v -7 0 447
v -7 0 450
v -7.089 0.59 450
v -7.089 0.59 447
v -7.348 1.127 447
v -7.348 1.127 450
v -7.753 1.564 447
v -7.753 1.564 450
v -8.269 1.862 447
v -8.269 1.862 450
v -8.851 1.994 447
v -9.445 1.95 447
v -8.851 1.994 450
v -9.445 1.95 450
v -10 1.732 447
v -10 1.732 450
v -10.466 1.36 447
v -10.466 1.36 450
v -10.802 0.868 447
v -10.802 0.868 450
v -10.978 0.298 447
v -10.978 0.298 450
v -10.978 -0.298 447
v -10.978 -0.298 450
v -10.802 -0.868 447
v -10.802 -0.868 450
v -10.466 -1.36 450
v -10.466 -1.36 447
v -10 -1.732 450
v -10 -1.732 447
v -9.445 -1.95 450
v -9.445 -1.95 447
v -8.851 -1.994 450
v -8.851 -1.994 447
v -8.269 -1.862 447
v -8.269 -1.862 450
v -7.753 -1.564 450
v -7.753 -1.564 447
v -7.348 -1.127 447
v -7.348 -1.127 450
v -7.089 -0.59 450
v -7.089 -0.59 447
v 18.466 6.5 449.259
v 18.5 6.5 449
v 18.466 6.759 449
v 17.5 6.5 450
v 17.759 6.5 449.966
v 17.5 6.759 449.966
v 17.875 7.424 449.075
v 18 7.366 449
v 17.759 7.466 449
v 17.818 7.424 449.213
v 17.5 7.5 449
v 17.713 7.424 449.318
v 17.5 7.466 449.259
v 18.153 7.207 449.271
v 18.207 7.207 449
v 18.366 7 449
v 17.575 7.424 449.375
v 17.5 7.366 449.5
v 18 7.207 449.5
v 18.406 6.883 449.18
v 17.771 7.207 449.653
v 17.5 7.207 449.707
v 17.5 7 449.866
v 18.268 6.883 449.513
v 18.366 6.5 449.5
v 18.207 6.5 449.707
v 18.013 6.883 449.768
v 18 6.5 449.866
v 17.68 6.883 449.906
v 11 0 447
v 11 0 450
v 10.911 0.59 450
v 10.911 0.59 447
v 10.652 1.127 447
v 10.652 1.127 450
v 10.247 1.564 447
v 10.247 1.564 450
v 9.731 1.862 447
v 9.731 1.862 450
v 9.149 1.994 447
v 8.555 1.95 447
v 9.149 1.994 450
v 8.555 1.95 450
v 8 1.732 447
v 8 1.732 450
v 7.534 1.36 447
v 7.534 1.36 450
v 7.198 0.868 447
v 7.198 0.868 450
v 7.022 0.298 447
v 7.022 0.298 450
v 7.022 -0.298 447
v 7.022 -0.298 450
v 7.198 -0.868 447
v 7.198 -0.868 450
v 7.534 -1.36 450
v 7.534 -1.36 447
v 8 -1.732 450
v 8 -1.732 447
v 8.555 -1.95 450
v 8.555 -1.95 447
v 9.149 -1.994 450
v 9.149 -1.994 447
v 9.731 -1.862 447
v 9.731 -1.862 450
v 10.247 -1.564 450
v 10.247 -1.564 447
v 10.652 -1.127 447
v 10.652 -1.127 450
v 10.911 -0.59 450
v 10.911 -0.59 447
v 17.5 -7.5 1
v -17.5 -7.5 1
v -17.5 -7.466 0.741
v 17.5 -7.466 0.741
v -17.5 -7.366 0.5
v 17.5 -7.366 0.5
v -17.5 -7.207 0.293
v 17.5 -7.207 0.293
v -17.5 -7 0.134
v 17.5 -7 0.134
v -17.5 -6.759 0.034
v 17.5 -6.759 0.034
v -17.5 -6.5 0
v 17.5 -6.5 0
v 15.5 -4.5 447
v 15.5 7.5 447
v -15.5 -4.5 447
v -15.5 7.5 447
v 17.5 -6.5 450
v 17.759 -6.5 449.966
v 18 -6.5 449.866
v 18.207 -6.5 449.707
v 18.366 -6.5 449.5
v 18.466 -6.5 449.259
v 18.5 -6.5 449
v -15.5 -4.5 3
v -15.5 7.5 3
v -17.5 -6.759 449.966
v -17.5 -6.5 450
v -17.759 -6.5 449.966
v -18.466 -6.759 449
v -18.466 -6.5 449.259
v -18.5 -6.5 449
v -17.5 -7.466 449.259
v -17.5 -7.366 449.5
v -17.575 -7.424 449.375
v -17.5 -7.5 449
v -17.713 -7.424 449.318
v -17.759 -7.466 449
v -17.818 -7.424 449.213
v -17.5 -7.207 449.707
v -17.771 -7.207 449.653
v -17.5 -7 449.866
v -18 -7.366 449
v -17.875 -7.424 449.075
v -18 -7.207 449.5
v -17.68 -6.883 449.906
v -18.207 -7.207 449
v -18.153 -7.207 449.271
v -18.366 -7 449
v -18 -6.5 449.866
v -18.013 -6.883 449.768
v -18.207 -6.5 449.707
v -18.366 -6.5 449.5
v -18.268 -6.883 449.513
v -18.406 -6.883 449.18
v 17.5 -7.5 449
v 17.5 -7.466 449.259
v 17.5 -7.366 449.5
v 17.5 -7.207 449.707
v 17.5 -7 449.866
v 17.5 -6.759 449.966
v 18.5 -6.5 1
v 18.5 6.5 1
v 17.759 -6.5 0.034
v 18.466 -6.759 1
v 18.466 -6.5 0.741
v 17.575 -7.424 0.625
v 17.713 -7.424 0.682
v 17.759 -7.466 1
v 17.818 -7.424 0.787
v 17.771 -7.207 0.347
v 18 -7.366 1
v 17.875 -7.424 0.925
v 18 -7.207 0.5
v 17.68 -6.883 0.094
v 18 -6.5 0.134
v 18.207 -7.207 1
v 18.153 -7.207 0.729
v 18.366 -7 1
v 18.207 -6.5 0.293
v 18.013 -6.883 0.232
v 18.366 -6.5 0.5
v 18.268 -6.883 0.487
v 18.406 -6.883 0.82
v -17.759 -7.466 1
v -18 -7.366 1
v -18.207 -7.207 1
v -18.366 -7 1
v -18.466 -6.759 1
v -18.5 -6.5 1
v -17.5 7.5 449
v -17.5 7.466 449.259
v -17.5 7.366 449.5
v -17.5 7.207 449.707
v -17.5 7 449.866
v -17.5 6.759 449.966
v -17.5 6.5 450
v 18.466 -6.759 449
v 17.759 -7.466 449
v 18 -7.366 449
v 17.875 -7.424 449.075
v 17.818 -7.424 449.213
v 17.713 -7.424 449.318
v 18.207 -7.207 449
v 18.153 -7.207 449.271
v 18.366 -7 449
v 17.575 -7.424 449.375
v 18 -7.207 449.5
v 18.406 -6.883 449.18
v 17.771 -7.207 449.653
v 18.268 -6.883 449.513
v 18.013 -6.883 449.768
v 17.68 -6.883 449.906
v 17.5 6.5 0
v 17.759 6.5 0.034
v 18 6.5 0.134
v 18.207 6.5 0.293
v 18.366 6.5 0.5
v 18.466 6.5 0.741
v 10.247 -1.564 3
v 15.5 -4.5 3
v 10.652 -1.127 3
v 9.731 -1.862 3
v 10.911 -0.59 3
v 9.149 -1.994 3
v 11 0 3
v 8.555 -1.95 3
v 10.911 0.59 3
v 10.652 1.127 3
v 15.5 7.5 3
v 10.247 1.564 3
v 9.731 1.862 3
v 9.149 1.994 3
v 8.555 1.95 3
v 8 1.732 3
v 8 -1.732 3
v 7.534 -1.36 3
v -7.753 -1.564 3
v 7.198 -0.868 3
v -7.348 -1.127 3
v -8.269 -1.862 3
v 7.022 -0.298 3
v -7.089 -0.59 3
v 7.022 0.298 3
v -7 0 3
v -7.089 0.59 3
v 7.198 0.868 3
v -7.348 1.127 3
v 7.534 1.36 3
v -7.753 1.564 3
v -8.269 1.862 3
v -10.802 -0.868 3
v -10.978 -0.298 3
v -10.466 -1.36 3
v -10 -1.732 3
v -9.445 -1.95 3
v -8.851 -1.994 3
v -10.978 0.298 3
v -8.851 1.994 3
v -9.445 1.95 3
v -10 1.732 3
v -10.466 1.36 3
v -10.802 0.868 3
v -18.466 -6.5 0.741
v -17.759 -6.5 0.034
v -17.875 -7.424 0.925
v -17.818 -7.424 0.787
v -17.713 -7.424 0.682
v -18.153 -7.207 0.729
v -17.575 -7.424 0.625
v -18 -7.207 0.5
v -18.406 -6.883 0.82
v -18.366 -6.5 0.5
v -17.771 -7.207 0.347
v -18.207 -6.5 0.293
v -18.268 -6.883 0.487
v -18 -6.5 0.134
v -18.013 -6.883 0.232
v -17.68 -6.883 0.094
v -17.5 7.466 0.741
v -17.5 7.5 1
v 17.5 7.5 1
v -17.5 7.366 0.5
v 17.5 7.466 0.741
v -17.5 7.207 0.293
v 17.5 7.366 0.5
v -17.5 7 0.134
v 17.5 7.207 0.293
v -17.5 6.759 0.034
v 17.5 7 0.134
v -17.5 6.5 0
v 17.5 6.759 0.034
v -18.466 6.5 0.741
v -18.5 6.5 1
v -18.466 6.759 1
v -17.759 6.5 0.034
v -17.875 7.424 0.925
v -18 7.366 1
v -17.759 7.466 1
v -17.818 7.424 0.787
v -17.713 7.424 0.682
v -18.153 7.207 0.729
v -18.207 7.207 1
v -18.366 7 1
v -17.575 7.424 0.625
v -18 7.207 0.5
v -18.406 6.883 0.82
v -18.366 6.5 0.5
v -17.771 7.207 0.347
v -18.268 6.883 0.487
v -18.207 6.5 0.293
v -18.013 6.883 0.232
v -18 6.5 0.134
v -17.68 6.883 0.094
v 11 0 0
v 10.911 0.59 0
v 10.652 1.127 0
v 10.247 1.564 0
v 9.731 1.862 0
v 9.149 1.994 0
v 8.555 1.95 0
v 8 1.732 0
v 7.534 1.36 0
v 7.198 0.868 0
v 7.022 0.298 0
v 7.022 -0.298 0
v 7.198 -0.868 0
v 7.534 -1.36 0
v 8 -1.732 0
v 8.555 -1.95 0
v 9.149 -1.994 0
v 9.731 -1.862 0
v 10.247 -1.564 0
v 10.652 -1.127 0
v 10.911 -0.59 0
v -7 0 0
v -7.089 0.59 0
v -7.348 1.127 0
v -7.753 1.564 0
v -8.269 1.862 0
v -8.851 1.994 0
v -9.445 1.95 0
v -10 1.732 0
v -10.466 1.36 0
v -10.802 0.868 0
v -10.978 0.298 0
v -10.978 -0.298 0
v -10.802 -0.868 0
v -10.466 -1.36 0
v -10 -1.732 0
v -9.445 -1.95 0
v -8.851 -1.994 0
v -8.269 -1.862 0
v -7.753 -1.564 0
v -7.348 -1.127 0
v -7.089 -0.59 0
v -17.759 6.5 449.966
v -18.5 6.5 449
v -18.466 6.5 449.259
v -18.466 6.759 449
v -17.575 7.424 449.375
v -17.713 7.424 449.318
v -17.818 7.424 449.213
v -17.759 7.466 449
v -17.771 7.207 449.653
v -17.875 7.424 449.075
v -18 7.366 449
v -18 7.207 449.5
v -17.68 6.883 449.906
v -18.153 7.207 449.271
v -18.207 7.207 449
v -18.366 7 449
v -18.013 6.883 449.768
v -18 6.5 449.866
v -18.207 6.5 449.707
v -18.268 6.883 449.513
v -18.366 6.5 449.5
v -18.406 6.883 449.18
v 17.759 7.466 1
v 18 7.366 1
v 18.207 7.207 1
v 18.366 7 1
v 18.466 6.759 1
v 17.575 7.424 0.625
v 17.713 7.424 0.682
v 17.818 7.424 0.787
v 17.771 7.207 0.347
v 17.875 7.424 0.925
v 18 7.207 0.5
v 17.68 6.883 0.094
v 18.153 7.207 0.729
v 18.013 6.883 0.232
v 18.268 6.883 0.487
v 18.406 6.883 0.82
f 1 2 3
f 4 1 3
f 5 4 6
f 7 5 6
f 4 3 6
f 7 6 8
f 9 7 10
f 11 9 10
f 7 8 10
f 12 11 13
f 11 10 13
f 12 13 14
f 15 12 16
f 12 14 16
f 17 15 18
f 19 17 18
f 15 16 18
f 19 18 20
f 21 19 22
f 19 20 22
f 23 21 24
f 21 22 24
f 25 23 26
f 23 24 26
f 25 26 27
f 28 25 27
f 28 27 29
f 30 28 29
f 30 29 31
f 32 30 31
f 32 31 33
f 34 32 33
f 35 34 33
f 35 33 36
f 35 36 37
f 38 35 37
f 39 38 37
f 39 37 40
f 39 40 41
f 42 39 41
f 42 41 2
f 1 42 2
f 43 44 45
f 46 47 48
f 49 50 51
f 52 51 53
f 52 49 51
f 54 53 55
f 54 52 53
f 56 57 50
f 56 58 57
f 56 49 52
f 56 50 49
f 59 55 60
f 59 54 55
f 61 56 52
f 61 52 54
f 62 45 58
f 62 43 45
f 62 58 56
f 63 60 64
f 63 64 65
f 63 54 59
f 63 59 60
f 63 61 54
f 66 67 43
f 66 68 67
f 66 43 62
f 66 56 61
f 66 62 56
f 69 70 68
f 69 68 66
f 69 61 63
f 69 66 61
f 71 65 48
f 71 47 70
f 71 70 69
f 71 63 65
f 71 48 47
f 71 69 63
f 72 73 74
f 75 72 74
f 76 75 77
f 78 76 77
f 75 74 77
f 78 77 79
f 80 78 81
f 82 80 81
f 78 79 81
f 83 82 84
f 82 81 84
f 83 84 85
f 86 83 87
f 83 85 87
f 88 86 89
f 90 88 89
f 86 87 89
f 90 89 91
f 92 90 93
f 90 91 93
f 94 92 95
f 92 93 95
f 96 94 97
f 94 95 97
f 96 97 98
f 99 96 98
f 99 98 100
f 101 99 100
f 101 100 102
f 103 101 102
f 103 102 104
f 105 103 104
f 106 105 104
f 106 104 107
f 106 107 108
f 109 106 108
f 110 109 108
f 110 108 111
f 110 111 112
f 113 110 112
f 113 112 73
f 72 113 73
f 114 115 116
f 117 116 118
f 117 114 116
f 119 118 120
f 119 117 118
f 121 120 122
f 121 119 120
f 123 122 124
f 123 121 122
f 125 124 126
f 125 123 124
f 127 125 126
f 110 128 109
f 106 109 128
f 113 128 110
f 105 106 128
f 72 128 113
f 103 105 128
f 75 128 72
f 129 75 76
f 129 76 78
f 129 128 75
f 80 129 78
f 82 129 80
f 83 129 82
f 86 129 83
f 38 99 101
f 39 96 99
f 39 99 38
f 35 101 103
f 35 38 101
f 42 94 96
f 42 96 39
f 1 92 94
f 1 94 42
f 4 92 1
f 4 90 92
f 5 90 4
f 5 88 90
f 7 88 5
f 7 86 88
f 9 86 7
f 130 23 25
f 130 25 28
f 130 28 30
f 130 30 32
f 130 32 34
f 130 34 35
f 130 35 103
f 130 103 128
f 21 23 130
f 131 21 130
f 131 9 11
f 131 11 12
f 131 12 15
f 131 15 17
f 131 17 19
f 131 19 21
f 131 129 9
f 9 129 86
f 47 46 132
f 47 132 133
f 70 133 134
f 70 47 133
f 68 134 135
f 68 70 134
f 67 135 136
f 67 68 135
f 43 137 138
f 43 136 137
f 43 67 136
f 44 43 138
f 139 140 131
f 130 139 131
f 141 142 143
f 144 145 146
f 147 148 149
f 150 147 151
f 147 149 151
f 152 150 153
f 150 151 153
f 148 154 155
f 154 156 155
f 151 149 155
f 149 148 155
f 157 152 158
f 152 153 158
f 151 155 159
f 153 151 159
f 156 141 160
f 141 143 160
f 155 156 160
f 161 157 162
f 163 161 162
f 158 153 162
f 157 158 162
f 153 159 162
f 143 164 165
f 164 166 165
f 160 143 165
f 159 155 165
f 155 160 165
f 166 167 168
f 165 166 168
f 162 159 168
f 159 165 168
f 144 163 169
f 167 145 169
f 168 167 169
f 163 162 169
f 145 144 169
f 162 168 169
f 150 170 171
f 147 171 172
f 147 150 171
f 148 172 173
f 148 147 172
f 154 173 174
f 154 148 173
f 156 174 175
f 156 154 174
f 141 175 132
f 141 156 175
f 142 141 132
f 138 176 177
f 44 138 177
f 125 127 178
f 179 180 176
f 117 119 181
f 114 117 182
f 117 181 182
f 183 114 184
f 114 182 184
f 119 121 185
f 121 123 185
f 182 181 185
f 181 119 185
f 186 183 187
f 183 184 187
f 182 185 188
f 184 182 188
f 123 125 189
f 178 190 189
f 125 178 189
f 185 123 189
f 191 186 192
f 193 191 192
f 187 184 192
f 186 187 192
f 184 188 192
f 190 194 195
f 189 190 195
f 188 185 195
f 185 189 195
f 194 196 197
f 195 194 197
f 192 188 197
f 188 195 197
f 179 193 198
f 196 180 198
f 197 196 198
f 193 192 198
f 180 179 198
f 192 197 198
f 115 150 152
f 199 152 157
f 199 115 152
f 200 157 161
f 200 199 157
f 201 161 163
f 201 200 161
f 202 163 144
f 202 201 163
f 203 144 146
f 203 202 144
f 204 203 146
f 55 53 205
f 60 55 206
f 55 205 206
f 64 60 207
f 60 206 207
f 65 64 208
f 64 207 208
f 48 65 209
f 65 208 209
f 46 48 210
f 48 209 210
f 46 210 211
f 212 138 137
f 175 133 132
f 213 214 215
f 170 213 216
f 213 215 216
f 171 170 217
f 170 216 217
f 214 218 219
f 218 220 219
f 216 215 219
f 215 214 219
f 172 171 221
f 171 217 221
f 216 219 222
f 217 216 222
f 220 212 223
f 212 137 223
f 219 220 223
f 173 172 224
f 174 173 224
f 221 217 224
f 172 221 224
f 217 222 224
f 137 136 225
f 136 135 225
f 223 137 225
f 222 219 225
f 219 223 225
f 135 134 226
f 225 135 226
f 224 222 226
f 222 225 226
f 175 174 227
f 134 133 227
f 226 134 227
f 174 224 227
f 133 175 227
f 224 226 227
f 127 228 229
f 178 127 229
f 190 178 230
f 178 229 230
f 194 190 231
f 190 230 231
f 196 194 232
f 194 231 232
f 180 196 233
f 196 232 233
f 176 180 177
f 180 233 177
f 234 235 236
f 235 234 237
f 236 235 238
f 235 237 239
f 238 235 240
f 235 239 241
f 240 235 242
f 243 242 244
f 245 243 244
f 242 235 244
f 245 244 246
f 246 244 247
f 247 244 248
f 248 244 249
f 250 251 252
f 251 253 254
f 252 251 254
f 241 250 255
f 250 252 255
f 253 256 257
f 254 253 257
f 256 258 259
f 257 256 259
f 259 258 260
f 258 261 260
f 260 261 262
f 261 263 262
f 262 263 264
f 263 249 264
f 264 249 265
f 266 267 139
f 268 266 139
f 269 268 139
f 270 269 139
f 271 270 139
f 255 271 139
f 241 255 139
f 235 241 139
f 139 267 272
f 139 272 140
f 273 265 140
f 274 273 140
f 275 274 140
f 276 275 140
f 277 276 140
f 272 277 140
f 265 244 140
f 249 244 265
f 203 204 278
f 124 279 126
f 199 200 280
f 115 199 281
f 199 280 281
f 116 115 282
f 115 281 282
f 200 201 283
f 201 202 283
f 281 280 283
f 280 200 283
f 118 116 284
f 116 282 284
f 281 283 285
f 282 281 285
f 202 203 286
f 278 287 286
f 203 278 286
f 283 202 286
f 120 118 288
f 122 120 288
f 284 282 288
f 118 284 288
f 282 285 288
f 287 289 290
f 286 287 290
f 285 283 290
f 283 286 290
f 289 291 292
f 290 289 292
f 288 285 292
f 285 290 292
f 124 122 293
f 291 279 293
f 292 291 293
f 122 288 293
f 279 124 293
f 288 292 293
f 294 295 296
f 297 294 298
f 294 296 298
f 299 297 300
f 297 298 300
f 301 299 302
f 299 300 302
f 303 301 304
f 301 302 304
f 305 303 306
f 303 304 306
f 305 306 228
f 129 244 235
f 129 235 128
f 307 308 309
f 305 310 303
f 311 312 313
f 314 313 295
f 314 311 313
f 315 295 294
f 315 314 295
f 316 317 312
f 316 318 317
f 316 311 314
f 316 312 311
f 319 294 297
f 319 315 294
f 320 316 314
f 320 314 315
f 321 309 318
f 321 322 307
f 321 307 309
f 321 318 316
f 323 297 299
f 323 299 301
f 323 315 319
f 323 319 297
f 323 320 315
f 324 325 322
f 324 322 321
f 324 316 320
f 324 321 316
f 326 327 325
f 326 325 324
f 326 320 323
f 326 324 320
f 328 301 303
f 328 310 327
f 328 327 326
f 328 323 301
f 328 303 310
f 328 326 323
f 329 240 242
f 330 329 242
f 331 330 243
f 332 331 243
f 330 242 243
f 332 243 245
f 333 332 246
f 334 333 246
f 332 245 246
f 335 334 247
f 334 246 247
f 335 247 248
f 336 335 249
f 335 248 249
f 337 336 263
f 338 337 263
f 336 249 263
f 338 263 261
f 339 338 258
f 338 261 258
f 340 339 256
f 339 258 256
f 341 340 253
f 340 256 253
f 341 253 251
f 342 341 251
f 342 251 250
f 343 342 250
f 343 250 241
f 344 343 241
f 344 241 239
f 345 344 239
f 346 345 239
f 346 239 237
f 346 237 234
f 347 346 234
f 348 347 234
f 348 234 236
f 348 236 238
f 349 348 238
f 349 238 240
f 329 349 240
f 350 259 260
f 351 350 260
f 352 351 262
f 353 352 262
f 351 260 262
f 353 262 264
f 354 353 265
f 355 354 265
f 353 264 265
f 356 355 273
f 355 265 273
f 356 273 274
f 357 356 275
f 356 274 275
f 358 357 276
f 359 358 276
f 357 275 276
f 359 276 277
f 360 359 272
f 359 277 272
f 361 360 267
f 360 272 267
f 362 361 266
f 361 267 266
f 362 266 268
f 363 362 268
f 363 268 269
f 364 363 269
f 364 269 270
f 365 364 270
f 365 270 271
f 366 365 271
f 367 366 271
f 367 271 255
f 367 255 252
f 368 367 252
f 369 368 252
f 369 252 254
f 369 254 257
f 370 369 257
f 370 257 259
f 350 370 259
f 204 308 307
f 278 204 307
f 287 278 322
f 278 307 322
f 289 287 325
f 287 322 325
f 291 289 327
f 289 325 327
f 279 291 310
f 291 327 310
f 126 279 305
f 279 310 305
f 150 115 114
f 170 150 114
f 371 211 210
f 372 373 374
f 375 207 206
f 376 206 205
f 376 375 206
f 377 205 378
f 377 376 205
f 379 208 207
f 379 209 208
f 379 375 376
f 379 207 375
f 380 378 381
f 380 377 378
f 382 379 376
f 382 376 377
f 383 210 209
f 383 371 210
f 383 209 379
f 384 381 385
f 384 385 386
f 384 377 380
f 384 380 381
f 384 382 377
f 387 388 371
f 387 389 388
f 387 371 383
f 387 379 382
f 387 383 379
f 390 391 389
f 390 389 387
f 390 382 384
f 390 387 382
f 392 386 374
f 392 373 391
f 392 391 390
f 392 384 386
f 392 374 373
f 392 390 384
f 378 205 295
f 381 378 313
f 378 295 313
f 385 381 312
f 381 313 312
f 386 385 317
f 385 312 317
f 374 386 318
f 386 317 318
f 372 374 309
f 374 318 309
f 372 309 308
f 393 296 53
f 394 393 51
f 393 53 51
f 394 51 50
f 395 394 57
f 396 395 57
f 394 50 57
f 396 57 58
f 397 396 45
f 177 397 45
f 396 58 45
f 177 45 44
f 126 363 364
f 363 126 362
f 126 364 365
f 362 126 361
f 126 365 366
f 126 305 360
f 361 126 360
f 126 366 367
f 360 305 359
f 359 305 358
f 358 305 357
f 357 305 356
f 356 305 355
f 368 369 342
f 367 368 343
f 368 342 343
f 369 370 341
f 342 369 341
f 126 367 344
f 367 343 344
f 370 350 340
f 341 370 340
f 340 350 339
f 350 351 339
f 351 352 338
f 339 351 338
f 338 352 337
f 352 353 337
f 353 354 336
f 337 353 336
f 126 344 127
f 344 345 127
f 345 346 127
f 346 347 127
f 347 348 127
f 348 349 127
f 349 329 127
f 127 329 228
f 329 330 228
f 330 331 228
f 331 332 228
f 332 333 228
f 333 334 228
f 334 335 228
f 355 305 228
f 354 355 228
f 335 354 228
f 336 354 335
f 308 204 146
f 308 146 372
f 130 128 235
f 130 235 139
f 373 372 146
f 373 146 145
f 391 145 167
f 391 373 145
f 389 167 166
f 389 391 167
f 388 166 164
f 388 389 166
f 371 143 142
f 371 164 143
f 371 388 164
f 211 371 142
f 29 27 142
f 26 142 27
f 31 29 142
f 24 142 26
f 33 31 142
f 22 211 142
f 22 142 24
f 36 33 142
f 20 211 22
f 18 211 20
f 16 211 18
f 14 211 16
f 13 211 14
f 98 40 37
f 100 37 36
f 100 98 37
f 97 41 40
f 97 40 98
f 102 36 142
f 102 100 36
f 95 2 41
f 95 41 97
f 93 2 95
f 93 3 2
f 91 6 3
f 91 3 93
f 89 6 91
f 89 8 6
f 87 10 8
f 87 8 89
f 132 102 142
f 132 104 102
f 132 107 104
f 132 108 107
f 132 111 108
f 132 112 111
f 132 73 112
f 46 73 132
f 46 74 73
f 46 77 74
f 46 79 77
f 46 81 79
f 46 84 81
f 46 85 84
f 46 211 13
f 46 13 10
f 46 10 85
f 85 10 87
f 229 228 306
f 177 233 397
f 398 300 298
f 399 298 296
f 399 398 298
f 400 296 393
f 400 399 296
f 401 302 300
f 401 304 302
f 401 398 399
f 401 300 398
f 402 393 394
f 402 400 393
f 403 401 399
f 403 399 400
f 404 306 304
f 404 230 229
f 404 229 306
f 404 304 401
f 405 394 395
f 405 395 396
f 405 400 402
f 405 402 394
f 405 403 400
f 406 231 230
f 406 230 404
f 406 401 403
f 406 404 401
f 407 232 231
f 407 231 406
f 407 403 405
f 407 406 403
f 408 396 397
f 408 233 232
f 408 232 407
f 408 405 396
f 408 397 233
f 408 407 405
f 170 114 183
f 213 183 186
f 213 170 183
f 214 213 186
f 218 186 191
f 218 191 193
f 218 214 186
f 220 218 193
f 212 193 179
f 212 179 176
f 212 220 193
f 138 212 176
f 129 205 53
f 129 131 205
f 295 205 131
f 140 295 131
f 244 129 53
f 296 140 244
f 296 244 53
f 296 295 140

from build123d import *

# Parameters (mm, degrees)
F0_W     = 37
F0_H     = 15
F1_DEPTH = 450
F2_W     = 31
F2_H     = 444
F3_DEPTH = 12
F4_R     = 2
F5_DEPTH = 450.001
F6_R     = 1
F7_R     = 1


with BuildPart() as f1:
    # F0 (on Top) → F1 (new body)
    with BuildSketch(Plane.XY):
        Rectangle(F0_W, F0_H)
    extrude(amount=F1_DEPTH)

    # F2 (on face) → F3 (cut)
    with BuildSketch(Plane(origin=(0, 7.5, 0), x_dir=(-1, 0, 0), z_dir=(0, 1, 0))):
        with Locations((0, 225)):
            Rectangle(F2_W, F2_H)
    extrude(amount=-F3_DEPTH, mode=Mode.SUBTRACT)

    # F4 (on face) → F5 (cut, through all)
    with BuildSketch(Plane.XY.offset(450)):
        with Locations((9, 0)):
            Circle(F4_R)
        with Locations((-9, 0)):
            Circle(F4_R)
    extrude(amount=-F5_DEPTH, mode=Mode.SUBTRACT)

    # F6
    f6_edges = [f1.edges().sort_by_distance(p)[0] for p in [
        (-18.5, 0, 450),
        (18.5, 0, 450),
        (-18.5, 0, 0),
        (18.5, 0, 0),
    ]]
    fillet(f6_edges, radius=F6_R)

    # F7
    f7_edges = [f1.edges().sort_by_distance(p)[0] for p in [
        (18.5, -7.5, 225),
        (18.5, 7.5, 225),
    ]]
    fillet(f7_edges, radius=F7_R)


solid = f1.part
